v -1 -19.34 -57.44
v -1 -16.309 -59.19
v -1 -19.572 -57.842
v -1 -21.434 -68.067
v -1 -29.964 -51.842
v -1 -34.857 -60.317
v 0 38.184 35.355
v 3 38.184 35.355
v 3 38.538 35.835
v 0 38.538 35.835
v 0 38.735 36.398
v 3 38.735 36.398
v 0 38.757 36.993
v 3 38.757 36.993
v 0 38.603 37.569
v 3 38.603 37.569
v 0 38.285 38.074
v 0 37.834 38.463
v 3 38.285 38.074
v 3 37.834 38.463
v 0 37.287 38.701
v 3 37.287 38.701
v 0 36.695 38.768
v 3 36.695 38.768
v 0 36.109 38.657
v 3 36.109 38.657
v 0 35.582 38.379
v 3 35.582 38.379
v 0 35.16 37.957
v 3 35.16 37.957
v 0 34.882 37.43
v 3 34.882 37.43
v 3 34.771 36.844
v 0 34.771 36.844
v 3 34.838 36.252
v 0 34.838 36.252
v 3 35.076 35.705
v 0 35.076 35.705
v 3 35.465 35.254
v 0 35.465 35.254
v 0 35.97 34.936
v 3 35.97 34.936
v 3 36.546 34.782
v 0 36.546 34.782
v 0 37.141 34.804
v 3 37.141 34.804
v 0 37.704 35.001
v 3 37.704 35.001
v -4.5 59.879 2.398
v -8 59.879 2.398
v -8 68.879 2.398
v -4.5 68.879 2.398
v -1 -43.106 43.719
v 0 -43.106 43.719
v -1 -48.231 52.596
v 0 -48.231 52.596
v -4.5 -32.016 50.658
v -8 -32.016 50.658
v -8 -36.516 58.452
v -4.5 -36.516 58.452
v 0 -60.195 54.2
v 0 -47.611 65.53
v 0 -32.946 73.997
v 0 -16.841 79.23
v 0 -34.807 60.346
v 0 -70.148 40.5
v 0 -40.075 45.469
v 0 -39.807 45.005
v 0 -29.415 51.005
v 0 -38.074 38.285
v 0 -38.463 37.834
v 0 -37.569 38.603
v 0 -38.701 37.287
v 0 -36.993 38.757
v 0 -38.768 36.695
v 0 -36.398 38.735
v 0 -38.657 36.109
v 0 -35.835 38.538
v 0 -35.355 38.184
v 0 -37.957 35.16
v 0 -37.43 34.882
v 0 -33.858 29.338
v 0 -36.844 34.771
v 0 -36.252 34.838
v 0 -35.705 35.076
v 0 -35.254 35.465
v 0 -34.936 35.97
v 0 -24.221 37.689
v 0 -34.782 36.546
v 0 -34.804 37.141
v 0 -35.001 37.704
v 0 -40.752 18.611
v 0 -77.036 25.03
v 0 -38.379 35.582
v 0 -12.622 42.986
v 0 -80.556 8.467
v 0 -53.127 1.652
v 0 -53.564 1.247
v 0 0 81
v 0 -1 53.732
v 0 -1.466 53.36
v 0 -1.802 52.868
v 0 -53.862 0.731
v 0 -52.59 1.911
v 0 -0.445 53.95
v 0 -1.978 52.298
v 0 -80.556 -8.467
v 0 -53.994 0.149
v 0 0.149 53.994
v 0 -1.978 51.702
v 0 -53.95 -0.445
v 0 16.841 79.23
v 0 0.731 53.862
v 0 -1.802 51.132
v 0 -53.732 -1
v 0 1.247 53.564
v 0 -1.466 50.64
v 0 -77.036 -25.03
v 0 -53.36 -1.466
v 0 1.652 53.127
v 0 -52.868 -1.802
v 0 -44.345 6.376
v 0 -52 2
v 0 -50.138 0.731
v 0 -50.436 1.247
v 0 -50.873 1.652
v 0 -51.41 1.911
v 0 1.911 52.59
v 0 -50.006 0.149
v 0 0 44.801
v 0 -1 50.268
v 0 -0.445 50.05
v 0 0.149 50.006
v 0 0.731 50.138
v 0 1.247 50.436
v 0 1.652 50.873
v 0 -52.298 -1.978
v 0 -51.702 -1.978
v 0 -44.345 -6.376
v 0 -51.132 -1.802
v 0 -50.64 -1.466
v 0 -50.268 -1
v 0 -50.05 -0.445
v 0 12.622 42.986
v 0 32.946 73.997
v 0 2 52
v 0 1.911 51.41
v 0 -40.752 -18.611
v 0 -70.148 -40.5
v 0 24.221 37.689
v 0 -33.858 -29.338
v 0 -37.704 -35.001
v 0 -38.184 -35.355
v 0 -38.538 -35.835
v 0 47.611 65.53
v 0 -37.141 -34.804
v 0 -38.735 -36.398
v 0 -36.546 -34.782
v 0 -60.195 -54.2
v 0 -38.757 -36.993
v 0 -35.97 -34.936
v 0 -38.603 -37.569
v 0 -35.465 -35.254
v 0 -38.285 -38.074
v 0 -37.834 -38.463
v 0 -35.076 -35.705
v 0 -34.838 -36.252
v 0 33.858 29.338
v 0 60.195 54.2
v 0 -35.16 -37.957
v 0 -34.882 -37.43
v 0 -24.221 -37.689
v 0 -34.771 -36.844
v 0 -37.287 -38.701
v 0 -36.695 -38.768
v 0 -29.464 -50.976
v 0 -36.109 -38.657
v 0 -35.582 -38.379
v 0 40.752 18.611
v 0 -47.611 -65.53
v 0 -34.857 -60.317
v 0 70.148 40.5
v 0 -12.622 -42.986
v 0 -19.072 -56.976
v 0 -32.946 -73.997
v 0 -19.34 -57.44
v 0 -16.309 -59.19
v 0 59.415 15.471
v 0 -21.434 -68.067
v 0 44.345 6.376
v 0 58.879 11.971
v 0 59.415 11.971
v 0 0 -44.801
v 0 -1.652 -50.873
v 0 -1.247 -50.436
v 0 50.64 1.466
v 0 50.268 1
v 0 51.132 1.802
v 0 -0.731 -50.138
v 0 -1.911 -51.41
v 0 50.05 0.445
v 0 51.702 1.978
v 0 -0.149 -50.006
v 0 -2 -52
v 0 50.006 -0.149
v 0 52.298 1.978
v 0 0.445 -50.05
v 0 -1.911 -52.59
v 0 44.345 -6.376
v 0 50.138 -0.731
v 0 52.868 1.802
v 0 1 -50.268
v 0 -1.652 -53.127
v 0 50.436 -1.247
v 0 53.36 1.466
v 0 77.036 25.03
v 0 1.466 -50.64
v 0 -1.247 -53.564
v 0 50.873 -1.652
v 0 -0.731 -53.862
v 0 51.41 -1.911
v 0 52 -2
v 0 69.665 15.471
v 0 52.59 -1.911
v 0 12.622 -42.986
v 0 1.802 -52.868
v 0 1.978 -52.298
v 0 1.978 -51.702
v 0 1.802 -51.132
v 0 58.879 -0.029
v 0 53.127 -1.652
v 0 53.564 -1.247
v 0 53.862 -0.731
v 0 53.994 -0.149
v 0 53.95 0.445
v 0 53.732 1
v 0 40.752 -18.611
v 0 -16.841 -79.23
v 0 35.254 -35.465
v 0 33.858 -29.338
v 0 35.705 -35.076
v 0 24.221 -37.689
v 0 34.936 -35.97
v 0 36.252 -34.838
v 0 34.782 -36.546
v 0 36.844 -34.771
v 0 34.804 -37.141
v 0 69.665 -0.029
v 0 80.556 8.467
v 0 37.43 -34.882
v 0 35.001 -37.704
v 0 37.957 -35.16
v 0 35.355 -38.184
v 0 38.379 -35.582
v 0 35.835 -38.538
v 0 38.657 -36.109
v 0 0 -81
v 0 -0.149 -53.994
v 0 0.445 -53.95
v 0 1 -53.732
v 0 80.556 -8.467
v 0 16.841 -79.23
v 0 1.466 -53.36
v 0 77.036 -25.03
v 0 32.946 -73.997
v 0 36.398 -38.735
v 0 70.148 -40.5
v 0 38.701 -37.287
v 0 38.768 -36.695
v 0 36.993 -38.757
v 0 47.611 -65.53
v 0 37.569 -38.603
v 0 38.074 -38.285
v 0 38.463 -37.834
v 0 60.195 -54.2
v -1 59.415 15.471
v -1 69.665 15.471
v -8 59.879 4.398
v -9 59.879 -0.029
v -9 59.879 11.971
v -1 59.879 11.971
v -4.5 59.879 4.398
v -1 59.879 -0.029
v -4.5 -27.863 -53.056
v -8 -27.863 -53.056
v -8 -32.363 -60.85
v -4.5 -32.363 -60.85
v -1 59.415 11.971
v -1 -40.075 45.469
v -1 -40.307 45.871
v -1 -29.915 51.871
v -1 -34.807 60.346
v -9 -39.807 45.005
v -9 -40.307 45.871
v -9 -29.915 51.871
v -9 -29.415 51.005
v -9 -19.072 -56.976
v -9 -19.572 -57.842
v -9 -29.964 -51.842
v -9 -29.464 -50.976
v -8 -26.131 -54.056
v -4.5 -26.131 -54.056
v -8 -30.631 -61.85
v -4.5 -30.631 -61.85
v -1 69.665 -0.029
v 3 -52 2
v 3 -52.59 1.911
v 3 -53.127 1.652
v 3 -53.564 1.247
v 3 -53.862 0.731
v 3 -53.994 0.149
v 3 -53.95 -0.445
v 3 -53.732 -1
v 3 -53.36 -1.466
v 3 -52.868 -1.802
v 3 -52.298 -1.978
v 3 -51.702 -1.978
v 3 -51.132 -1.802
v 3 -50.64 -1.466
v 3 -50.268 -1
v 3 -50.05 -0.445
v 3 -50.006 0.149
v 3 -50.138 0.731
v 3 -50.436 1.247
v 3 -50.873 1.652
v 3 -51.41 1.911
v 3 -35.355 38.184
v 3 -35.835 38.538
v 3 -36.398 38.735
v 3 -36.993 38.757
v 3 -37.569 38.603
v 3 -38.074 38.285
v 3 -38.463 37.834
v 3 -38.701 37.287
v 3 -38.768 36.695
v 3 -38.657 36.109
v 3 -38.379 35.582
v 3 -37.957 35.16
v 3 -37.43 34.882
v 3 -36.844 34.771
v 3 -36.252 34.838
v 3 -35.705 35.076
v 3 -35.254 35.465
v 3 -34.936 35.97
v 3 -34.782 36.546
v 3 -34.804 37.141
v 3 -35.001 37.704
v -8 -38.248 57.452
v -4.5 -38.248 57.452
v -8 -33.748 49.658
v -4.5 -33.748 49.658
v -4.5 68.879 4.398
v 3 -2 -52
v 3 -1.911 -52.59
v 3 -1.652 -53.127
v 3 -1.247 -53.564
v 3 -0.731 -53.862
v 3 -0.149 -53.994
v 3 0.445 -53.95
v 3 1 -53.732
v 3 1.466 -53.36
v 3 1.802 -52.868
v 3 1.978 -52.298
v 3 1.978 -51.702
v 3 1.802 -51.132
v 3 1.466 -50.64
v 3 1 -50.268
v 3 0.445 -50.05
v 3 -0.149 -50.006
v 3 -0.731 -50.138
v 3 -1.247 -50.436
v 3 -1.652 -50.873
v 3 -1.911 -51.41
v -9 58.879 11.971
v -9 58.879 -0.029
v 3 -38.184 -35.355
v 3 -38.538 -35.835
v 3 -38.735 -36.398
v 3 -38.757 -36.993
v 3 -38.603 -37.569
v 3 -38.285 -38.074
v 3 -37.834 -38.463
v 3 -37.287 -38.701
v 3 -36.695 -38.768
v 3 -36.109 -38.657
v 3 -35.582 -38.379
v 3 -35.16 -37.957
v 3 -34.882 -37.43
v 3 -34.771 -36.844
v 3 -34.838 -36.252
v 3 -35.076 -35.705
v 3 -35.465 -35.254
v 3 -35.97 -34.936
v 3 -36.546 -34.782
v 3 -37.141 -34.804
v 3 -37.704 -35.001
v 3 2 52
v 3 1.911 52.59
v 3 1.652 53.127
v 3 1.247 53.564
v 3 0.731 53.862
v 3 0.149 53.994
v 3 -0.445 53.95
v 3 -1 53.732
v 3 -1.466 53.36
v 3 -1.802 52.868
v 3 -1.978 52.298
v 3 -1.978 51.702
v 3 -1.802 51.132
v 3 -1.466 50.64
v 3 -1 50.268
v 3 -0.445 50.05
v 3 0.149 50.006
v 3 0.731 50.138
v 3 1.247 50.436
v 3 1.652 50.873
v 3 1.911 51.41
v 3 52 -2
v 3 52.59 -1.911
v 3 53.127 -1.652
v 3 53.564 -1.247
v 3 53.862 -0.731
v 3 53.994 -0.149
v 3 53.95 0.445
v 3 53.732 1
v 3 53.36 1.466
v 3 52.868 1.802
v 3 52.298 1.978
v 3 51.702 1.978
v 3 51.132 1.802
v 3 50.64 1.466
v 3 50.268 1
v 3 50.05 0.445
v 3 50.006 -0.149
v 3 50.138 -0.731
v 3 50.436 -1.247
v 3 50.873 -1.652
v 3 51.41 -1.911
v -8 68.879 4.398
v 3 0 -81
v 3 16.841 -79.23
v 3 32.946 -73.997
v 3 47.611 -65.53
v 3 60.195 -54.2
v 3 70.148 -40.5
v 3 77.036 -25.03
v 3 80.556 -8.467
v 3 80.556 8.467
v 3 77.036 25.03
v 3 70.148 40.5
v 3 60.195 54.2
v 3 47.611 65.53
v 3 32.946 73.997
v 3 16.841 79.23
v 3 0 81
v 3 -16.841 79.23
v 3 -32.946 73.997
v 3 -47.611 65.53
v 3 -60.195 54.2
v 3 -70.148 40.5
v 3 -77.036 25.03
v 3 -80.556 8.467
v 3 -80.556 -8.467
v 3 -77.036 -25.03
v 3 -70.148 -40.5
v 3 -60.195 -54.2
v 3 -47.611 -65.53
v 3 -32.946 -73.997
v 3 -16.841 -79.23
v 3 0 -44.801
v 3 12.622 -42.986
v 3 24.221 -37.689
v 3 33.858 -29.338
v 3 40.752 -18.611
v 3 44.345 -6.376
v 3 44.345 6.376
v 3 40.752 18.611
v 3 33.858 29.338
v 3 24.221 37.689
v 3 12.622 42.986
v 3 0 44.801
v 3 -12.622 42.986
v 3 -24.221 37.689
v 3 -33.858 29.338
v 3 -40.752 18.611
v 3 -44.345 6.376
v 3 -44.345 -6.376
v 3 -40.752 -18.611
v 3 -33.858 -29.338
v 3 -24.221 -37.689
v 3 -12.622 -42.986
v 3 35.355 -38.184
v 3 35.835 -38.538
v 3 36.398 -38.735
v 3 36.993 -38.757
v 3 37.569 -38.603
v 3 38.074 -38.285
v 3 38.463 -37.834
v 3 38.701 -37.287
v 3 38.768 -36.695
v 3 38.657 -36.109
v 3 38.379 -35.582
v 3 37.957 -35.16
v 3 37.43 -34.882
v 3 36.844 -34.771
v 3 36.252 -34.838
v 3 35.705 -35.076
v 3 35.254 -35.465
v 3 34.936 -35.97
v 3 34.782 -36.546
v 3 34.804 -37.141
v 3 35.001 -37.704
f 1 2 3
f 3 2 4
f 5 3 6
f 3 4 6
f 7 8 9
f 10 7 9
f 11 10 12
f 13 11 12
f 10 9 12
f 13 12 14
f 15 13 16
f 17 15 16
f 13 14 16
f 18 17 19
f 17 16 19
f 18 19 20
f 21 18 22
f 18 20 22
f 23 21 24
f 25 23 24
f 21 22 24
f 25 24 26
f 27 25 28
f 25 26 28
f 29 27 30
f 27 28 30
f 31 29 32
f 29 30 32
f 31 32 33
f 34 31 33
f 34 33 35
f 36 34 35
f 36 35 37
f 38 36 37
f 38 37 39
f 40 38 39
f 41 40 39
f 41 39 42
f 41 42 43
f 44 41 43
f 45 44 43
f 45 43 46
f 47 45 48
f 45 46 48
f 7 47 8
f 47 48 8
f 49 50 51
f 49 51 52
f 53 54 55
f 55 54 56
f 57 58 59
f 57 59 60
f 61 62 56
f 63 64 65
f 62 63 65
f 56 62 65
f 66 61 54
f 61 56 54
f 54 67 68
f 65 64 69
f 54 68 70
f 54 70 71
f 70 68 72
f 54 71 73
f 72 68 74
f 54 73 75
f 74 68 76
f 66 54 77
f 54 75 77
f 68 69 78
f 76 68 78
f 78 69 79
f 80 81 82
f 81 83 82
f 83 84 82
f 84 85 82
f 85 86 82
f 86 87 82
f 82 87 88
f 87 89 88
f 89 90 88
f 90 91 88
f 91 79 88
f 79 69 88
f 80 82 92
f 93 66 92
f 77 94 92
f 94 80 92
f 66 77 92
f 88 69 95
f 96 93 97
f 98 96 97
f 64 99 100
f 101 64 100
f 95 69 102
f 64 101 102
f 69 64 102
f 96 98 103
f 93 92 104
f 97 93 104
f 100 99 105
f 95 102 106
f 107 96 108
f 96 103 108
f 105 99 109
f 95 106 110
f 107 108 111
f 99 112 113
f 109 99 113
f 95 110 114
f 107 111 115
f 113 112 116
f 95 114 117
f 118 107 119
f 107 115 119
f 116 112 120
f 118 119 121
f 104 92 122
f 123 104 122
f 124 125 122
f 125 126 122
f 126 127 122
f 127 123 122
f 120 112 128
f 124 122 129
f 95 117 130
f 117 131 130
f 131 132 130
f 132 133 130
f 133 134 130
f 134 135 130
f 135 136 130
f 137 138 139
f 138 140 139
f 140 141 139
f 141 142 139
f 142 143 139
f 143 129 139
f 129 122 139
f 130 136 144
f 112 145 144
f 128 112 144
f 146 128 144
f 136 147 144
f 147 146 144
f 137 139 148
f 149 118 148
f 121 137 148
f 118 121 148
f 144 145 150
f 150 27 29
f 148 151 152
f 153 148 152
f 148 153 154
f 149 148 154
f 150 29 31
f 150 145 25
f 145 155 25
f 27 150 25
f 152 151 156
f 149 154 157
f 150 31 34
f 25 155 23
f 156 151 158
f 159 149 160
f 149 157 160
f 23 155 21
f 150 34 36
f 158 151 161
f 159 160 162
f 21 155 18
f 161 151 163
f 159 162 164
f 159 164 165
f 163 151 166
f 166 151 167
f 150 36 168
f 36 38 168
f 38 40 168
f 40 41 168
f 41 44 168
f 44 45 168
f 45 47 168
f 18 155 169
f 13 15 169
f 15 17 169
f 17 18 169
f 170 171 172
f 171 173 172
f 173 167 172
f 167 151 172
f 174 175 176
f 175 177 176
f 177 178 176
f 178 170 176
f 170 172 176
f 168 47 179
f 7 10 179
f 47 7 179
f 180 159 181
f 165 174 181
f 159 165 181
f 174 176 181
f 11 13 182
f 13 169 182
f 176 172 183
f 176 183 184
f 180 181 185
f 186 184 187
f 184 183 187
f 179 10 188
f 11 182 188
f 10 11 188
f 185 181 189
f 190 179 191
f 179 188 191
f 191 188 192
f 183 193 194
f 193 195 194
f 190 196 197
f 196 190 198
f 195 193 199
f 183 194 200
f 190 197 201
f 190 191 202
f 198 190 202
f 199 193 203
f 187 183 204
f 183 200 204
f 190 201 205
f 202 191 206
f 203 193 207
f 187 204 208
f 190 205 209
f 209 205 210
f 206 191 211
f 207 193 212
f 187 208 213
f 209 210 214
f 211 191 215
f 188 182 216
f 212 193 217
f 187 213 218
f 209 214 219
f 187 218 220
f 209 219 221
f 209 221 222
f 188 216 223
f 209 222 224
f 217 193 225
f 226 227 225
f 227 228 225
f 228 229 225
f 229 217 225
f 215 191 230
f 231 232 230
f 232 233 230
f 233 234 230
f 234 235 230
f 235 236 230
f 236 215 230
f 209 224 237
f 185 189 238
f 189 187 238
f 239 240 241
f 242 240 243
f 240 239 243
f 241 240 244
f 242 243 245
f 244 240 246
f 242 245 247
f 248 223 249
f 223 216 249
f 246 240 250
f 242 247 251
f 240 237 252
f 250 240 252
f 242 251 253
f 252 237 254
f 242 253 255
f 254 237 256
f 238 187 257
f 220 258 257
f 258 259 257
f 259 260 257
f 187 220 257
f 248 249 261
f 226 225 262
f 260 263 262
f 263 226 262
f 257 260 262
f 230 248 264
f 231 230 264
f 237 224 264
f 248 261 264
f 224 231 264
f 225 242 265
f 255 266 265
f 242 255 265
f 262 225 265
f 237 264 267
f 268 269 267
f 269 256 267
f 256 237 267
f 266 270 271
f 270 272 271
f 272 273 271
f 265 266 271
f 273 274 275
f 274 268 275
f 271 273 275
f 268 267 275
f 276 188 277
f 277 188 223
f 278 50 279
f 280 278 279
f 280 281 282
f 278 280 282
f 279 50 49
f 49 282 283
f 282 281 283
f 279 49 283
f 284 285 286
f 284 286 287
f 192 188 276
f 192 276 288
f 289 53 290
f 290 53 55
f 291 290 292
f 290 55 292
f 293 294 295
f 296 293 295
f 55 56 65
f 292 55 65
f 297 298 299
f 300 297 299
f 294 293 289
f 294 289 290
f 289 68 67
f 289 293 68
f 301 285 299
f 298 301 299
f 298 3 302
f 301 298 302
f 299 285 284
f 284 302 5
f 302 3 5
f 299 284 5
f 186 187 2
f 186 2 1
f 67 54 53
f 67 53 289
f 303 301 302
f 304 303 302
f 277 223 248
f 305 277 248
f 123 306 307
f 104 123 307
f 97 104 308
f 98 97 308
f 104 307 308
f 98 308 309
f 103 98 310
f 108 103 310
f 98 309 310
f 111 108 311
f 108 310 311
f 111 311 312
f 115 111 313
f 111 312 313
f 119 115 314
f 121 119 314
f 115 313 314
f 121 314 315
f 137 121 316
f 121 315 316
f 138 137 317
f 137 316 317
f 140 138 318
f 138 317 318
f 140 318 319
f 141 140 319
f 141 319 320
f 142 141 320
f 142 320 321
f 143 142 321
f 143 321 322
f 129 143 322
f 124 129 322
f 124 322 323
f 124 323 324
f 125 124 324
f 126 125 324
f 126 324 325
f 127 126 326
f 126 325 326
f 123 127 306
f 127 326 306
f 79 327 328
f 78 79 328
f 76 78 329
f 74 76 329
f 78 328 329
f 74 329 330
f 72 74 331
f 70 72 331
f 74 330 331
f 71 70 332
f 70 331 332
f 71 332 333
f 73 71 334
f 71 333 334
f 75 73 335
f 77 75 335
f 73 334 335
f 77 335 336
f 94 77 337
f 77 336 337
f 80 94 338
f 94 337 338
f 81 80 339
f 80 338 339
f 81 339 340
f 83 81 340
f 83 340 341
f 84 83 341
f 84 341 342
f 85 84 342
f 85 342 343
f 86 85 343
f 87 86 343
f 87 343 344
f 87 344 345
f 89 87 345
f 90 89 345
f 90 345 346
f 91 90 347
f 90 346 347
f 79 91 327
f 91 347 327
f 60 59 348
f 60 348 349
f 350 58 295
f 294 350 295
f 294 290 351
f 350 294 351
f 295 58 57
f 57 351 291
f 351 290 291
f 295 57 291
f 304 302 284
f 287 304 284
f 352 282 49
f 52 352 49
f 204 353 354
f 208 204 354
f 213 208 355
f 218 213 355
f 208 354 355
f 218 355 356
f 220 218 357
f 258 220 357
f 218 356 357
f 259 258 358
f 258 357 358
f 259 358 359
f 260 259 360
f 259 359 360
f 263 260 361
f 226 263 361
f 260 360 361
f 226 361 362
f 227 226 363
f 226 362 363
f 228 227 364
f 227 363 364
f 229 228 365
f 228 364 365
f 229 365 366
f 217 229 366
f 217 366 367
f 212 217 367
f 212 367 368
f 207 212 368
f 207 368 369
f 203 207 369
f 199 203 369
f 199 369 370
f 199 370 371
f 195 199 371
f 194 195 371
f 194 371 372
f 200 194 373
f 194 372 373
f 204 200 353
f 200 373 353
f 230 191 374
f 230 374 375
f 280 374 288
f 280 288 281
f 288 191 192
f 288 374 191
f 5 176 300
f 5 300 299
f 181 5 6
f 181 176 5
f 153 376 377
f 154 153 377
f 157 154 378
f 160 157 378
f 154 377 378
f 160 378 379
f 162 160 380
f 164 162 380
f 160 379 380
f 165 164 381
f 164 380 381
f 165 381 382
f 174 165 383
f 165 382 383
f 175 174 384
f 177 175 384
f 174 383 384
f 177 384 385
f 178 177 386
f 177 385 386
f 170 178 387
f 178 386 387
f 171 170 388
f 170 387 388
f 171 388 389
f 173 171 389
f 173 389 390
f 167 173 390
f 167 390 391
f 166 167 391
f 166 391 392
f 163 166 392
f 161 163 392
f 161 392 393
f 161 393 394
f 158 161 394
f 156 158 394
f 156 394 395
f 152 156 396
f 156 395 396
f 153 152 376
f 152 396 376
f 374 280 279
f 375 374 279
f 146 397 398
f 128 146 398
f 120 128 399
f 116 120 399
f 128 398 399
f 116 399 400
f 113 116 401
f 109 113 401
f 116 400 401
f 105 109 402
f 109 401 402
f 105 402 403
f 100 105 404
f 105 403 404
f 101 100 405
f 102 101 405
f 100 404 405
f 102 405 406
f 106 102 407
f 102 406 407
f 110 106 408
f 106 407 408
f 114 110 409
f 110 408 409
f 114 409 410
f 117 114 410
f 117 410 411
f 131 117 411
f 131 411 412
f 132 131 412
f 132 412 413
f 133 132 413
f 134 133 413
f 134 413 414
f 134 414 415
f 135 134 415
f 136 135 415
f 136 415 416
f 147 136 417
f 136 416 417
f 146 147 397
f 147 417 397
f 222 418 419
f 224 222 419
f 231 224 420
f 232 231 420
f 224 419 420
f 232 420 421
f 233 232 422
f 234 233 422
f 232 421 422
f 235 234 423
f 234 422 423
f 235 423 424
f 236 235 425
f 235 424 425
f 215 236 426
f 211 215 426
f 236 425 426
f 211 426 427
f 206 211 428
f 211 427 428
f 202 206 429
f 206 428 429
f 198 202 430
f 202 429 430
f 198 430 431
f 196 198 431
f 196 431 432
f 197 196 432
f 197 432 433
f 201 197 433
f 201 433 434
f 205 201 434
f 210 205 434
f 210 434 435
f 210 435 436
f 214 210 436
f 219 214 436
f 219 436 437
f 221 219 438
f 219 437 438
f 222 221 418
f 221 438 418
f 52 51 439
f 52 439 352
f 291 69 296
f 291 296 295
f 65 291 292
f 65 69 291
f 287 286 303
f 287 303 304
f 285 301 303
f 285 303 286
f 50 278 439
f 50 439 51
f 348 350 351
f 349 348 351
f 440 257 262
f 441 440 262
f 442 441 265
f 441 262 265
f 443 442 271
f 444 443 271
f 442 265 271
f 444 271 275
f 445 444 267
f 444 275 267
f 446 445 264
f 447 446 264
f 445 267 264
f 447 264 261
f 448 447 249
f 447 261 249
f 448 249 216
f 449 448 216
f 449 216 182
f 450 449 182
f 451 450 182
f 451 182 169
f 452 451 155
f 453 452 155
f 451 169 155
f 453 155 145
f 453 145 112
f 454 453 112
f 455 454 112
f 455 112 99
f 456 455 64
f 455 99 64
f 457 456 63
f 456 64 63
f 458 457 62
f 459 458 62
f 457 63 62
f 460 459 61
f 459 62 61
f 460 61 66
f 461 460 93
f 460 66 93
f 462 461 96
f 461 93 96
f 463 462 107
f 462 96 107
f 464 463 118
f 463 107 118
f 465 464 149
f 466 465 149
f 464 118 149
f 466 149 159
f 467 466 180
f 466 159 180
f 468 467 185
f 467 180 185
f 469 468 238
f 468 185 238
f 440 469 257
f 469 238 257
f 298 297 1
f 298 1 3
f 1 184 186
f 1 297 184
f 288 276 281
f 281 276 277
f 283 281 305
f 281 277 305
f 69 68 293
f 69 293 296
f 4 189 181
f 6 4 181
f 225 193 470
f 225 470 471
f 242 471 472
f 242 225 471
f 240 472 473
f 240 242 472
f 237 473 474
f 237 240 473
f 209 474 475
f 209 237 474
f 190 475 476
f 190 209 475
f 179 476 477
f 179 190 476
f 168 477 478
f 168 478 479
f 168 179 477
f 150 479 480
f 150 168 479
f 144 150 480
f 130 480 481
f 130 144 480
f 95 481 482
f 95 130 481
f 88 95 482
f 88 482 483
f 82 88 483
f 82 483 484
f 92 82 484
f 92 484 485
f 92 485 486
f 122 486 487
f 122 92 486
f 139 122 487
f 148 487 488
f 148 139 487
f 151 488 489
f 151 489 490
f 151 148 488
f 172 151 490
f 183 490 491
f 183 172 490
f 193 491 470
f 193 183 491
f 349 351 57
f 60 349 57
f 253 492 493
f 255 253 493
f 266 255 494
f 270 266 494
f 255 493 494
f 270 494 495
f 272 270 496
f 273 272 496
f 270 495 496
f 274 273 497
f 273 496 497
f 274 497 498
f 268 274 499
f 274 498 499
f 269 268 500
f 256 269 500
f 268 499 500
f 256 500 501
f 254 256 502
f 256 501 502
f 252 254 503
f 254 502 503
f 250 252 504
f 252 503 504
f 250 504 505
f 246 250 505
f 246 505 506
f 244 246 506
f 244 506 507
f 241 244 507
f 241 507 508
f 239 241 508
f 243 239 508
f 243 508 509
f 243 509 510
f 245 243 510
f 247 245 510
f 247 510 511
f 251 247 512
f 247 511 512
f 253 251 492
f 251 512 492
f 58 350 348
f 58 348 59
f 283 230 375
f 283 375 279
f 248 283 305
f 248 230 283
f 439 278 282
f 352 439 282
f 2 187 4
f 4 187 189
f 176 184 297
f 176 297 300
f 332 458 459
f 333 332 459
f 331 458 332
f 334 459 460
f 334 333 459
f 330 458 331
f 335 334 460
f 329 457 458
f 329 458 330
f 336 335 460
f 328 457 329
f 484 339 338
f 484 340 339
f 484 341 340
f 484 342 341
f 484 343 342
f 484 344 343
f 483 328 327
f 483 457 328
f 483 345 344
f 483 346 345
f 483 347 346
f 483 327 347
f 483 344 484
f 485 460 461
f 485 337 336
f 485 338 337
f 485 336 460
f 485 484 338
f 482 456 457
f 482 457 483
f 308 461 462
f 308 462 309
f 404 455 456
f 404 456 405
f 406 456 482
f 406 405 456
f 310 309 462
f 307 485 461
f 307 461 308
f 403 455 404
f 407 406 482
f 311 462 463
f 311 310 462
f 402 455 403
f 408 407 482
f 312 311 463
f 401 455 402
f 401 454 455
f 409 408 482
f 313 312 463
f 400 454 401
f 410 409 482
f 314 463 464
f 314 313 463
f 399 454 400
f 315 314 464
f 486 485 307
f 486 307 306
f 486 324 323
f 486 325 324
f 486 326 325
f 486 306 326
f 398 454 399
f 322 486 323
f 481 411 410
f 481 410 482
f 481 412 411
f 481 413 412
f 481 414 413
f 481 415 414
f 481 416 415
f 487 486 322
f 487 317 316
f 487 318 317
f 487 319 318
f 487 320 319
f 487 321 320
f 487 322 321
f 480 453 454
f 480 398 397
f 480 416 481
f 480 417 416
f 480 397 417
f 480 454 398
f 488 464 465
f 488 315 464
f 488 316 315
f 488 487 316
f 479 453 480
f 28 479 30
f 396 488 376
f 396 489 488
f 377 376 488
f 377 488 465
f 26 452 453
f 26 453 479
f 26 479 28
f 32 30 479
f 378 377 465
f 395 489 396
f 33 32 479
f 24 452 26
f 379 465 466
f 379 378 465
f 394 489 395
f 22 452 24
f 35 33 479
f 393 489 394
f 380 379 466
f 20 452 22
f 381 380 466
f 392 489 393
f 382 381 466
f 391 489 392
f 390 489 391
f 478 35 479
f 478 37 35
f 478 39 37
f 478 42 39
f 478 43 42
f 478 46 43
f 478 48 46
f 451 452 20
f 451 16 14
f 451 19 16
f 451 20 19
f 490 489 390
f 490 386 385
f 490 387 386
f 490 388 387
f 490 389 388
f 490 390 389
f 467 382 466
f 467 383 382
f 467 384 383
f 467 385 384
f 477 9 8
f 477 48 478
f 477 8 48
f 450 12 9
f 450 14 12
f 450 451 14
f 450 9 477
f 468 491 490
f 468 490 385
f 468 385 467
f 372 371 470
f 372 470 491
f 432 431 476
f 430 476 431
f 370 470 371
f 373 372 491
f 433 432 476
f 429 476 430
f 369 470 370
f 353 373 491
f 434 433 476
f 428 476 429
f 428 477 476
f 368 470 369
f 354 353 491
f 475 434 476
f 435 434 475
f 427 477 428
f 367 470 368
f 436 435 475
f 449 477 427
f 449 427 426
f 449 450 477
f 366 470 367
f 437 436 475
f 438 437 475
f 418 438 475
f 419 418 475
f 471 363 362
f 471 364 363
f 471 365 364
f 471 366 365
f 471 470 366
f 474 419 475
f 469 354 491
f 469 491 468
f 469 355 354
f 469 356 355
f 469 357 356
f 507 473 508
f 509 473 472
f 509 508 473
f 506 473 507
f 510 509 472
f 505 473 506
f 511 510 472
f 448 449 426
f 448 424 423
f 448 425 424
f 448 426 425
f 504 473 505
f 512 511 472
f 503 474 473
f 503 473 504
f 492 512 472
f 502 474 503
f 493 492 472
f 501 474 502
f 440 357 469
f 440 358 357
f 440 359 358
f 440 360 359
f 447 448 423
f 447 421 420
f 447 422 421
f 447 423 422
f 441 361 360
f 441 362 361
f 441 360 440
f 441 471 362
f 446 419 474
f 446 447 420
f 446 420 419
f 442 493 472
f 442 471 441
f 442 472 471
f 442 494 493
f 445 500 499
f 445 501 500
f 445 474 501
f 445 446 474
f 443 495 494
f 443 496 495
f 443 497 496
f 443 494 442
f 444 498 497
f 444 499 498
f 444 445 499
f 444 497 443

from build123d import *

# Parameters (mm, degrees)
SKETCH1_R           = 81
SKETCH1_R_2         = 44.800813008
BOSS_EXTRUDE1_DEPTH = 3
SKETCH2_R           = 2
CUT_EXTRUDE1_DEPTH  = 3
CIRPATTERN1_COUNT   = 8
SKETCH3_W           = 15.5
SKETCH3_H           = 10.25
BOSS_EXTRUDE2_DEPTH = 1
SKETCH4_W           = 12
SKETCH4_H           = 1
BOSS_EXTRUDE3_DEPTH = 9
SKETCH5_W           = 3.5
SKETCH5_H           = 2
BOSS_EXTRUDE4_DEPTH = 9
CIRPATTERN5_COUNT   = 3


with BuildPart() as part:
    # Sketch1 → Boss-Extrude1 (new body)
    with BuildSketch(Plane(origin=(0, 0, 0), x_dir=(0, 0, -1), z_dir=(1, 0, 0))):
        Circle(SKETCH1_R)
        Circle(SKETCH1_R_2, mode=Mode.SUBTRACT)
    extrude(amount=BOSS_EXTRUDE1_DEPTH)

    # Sketch2 → Cut-Extrude1 (cut)
    with BuildSketch(Plane(origin=(3, 0, 0), x_dir=(0, 0, -1), z_dir=(1, 0, 0))):
        with Locations((0, 52)):
            Circle(SKETCH2_R)
    cut_extrude1 = extrude(amount=-CUT_EXTRUDE1_DEPTH, mode=Mode.SUBTRACT)

    # CirPattern1: Cut-Extrude1 ×8 about axis
    cirpattern1_axis = Axis((0, 0, 0), (1, 0, 0))
    for i in range(1, CIRPATTERN1_COUNT):
        add(cut_extrude1.rotate(cirpattern1_axis, i * 360 / CIRPATTERN1_COUNT), mode=Mode.SUBTRACT)

    # Sketch3 → Boss-Extrude2 (add)
    with BuildSketch(Plane(origin=(0, 0, 0), x_dir=(0, 0, -1), z_dir=(1, 0, 0))):
        with Locations((-7.721207901, 64.539778033)):
            Rectangle(SKETCH3_W, SKETCH3_H)
    boss_extrude2 = extrude(amount=-BOSS_EXTRUDE2_DEPTH)

    # Sketch4 → Boss-Extrude3 (add)
    with BuildSketch(Plane(origin=(0, 0, 0), x_dir=(0, 0, -1), z_dir=(1, 0, 0))):
        with Locations((-5.971207901, 59.379009095)):
            Rectangle(SKETCH4_W, SKETCH4_H)
    boss_extrude3 = extrude(amount=-BOSS_EXTRUDE3_DEPTH)

    # Sketch5 → Boss-Extrude4 (add)
    with BuildSketch(Plane(origin=(0, 59.879009095, 0), x_dir=(1, 0, 0), z_dir=(0, 1, 0))):
        with Locations((-6.25, -3.398209268)):
            Rectangle(SKETCH5_W, SKETCH5_H)
    boss_extrude4 = extrude(amount=BOSS_EXTRUDE4_DEPTH)

    # CirPattern5: Boss-Extrude2, Boss-Extrude3, Boss-Extrude4 ×3 about axis
    cirpattern5_axis = Axis((0, 0, 0), (1, 0, 0))
    add([boss_extrude2.rotate(cirpattern5_axis, i * 360 / CIRPATTERN5_COUNT) for i in range(1, CIRPATTERN5_COUNT)])
    add([boss_extrude3.rotate(cirpattern5_axis, i * 360 / CIRPATTERN5_COUNT) for i in range(1, CIRPATTERN5_COUNT)])
    add([boss_extrude4.rotate(cirpattern5_axis, i * 360 / CIRPATTERN5_COUNT) for i in range(1, CIRPATTERN5_COUNT)])


solid = part.part
